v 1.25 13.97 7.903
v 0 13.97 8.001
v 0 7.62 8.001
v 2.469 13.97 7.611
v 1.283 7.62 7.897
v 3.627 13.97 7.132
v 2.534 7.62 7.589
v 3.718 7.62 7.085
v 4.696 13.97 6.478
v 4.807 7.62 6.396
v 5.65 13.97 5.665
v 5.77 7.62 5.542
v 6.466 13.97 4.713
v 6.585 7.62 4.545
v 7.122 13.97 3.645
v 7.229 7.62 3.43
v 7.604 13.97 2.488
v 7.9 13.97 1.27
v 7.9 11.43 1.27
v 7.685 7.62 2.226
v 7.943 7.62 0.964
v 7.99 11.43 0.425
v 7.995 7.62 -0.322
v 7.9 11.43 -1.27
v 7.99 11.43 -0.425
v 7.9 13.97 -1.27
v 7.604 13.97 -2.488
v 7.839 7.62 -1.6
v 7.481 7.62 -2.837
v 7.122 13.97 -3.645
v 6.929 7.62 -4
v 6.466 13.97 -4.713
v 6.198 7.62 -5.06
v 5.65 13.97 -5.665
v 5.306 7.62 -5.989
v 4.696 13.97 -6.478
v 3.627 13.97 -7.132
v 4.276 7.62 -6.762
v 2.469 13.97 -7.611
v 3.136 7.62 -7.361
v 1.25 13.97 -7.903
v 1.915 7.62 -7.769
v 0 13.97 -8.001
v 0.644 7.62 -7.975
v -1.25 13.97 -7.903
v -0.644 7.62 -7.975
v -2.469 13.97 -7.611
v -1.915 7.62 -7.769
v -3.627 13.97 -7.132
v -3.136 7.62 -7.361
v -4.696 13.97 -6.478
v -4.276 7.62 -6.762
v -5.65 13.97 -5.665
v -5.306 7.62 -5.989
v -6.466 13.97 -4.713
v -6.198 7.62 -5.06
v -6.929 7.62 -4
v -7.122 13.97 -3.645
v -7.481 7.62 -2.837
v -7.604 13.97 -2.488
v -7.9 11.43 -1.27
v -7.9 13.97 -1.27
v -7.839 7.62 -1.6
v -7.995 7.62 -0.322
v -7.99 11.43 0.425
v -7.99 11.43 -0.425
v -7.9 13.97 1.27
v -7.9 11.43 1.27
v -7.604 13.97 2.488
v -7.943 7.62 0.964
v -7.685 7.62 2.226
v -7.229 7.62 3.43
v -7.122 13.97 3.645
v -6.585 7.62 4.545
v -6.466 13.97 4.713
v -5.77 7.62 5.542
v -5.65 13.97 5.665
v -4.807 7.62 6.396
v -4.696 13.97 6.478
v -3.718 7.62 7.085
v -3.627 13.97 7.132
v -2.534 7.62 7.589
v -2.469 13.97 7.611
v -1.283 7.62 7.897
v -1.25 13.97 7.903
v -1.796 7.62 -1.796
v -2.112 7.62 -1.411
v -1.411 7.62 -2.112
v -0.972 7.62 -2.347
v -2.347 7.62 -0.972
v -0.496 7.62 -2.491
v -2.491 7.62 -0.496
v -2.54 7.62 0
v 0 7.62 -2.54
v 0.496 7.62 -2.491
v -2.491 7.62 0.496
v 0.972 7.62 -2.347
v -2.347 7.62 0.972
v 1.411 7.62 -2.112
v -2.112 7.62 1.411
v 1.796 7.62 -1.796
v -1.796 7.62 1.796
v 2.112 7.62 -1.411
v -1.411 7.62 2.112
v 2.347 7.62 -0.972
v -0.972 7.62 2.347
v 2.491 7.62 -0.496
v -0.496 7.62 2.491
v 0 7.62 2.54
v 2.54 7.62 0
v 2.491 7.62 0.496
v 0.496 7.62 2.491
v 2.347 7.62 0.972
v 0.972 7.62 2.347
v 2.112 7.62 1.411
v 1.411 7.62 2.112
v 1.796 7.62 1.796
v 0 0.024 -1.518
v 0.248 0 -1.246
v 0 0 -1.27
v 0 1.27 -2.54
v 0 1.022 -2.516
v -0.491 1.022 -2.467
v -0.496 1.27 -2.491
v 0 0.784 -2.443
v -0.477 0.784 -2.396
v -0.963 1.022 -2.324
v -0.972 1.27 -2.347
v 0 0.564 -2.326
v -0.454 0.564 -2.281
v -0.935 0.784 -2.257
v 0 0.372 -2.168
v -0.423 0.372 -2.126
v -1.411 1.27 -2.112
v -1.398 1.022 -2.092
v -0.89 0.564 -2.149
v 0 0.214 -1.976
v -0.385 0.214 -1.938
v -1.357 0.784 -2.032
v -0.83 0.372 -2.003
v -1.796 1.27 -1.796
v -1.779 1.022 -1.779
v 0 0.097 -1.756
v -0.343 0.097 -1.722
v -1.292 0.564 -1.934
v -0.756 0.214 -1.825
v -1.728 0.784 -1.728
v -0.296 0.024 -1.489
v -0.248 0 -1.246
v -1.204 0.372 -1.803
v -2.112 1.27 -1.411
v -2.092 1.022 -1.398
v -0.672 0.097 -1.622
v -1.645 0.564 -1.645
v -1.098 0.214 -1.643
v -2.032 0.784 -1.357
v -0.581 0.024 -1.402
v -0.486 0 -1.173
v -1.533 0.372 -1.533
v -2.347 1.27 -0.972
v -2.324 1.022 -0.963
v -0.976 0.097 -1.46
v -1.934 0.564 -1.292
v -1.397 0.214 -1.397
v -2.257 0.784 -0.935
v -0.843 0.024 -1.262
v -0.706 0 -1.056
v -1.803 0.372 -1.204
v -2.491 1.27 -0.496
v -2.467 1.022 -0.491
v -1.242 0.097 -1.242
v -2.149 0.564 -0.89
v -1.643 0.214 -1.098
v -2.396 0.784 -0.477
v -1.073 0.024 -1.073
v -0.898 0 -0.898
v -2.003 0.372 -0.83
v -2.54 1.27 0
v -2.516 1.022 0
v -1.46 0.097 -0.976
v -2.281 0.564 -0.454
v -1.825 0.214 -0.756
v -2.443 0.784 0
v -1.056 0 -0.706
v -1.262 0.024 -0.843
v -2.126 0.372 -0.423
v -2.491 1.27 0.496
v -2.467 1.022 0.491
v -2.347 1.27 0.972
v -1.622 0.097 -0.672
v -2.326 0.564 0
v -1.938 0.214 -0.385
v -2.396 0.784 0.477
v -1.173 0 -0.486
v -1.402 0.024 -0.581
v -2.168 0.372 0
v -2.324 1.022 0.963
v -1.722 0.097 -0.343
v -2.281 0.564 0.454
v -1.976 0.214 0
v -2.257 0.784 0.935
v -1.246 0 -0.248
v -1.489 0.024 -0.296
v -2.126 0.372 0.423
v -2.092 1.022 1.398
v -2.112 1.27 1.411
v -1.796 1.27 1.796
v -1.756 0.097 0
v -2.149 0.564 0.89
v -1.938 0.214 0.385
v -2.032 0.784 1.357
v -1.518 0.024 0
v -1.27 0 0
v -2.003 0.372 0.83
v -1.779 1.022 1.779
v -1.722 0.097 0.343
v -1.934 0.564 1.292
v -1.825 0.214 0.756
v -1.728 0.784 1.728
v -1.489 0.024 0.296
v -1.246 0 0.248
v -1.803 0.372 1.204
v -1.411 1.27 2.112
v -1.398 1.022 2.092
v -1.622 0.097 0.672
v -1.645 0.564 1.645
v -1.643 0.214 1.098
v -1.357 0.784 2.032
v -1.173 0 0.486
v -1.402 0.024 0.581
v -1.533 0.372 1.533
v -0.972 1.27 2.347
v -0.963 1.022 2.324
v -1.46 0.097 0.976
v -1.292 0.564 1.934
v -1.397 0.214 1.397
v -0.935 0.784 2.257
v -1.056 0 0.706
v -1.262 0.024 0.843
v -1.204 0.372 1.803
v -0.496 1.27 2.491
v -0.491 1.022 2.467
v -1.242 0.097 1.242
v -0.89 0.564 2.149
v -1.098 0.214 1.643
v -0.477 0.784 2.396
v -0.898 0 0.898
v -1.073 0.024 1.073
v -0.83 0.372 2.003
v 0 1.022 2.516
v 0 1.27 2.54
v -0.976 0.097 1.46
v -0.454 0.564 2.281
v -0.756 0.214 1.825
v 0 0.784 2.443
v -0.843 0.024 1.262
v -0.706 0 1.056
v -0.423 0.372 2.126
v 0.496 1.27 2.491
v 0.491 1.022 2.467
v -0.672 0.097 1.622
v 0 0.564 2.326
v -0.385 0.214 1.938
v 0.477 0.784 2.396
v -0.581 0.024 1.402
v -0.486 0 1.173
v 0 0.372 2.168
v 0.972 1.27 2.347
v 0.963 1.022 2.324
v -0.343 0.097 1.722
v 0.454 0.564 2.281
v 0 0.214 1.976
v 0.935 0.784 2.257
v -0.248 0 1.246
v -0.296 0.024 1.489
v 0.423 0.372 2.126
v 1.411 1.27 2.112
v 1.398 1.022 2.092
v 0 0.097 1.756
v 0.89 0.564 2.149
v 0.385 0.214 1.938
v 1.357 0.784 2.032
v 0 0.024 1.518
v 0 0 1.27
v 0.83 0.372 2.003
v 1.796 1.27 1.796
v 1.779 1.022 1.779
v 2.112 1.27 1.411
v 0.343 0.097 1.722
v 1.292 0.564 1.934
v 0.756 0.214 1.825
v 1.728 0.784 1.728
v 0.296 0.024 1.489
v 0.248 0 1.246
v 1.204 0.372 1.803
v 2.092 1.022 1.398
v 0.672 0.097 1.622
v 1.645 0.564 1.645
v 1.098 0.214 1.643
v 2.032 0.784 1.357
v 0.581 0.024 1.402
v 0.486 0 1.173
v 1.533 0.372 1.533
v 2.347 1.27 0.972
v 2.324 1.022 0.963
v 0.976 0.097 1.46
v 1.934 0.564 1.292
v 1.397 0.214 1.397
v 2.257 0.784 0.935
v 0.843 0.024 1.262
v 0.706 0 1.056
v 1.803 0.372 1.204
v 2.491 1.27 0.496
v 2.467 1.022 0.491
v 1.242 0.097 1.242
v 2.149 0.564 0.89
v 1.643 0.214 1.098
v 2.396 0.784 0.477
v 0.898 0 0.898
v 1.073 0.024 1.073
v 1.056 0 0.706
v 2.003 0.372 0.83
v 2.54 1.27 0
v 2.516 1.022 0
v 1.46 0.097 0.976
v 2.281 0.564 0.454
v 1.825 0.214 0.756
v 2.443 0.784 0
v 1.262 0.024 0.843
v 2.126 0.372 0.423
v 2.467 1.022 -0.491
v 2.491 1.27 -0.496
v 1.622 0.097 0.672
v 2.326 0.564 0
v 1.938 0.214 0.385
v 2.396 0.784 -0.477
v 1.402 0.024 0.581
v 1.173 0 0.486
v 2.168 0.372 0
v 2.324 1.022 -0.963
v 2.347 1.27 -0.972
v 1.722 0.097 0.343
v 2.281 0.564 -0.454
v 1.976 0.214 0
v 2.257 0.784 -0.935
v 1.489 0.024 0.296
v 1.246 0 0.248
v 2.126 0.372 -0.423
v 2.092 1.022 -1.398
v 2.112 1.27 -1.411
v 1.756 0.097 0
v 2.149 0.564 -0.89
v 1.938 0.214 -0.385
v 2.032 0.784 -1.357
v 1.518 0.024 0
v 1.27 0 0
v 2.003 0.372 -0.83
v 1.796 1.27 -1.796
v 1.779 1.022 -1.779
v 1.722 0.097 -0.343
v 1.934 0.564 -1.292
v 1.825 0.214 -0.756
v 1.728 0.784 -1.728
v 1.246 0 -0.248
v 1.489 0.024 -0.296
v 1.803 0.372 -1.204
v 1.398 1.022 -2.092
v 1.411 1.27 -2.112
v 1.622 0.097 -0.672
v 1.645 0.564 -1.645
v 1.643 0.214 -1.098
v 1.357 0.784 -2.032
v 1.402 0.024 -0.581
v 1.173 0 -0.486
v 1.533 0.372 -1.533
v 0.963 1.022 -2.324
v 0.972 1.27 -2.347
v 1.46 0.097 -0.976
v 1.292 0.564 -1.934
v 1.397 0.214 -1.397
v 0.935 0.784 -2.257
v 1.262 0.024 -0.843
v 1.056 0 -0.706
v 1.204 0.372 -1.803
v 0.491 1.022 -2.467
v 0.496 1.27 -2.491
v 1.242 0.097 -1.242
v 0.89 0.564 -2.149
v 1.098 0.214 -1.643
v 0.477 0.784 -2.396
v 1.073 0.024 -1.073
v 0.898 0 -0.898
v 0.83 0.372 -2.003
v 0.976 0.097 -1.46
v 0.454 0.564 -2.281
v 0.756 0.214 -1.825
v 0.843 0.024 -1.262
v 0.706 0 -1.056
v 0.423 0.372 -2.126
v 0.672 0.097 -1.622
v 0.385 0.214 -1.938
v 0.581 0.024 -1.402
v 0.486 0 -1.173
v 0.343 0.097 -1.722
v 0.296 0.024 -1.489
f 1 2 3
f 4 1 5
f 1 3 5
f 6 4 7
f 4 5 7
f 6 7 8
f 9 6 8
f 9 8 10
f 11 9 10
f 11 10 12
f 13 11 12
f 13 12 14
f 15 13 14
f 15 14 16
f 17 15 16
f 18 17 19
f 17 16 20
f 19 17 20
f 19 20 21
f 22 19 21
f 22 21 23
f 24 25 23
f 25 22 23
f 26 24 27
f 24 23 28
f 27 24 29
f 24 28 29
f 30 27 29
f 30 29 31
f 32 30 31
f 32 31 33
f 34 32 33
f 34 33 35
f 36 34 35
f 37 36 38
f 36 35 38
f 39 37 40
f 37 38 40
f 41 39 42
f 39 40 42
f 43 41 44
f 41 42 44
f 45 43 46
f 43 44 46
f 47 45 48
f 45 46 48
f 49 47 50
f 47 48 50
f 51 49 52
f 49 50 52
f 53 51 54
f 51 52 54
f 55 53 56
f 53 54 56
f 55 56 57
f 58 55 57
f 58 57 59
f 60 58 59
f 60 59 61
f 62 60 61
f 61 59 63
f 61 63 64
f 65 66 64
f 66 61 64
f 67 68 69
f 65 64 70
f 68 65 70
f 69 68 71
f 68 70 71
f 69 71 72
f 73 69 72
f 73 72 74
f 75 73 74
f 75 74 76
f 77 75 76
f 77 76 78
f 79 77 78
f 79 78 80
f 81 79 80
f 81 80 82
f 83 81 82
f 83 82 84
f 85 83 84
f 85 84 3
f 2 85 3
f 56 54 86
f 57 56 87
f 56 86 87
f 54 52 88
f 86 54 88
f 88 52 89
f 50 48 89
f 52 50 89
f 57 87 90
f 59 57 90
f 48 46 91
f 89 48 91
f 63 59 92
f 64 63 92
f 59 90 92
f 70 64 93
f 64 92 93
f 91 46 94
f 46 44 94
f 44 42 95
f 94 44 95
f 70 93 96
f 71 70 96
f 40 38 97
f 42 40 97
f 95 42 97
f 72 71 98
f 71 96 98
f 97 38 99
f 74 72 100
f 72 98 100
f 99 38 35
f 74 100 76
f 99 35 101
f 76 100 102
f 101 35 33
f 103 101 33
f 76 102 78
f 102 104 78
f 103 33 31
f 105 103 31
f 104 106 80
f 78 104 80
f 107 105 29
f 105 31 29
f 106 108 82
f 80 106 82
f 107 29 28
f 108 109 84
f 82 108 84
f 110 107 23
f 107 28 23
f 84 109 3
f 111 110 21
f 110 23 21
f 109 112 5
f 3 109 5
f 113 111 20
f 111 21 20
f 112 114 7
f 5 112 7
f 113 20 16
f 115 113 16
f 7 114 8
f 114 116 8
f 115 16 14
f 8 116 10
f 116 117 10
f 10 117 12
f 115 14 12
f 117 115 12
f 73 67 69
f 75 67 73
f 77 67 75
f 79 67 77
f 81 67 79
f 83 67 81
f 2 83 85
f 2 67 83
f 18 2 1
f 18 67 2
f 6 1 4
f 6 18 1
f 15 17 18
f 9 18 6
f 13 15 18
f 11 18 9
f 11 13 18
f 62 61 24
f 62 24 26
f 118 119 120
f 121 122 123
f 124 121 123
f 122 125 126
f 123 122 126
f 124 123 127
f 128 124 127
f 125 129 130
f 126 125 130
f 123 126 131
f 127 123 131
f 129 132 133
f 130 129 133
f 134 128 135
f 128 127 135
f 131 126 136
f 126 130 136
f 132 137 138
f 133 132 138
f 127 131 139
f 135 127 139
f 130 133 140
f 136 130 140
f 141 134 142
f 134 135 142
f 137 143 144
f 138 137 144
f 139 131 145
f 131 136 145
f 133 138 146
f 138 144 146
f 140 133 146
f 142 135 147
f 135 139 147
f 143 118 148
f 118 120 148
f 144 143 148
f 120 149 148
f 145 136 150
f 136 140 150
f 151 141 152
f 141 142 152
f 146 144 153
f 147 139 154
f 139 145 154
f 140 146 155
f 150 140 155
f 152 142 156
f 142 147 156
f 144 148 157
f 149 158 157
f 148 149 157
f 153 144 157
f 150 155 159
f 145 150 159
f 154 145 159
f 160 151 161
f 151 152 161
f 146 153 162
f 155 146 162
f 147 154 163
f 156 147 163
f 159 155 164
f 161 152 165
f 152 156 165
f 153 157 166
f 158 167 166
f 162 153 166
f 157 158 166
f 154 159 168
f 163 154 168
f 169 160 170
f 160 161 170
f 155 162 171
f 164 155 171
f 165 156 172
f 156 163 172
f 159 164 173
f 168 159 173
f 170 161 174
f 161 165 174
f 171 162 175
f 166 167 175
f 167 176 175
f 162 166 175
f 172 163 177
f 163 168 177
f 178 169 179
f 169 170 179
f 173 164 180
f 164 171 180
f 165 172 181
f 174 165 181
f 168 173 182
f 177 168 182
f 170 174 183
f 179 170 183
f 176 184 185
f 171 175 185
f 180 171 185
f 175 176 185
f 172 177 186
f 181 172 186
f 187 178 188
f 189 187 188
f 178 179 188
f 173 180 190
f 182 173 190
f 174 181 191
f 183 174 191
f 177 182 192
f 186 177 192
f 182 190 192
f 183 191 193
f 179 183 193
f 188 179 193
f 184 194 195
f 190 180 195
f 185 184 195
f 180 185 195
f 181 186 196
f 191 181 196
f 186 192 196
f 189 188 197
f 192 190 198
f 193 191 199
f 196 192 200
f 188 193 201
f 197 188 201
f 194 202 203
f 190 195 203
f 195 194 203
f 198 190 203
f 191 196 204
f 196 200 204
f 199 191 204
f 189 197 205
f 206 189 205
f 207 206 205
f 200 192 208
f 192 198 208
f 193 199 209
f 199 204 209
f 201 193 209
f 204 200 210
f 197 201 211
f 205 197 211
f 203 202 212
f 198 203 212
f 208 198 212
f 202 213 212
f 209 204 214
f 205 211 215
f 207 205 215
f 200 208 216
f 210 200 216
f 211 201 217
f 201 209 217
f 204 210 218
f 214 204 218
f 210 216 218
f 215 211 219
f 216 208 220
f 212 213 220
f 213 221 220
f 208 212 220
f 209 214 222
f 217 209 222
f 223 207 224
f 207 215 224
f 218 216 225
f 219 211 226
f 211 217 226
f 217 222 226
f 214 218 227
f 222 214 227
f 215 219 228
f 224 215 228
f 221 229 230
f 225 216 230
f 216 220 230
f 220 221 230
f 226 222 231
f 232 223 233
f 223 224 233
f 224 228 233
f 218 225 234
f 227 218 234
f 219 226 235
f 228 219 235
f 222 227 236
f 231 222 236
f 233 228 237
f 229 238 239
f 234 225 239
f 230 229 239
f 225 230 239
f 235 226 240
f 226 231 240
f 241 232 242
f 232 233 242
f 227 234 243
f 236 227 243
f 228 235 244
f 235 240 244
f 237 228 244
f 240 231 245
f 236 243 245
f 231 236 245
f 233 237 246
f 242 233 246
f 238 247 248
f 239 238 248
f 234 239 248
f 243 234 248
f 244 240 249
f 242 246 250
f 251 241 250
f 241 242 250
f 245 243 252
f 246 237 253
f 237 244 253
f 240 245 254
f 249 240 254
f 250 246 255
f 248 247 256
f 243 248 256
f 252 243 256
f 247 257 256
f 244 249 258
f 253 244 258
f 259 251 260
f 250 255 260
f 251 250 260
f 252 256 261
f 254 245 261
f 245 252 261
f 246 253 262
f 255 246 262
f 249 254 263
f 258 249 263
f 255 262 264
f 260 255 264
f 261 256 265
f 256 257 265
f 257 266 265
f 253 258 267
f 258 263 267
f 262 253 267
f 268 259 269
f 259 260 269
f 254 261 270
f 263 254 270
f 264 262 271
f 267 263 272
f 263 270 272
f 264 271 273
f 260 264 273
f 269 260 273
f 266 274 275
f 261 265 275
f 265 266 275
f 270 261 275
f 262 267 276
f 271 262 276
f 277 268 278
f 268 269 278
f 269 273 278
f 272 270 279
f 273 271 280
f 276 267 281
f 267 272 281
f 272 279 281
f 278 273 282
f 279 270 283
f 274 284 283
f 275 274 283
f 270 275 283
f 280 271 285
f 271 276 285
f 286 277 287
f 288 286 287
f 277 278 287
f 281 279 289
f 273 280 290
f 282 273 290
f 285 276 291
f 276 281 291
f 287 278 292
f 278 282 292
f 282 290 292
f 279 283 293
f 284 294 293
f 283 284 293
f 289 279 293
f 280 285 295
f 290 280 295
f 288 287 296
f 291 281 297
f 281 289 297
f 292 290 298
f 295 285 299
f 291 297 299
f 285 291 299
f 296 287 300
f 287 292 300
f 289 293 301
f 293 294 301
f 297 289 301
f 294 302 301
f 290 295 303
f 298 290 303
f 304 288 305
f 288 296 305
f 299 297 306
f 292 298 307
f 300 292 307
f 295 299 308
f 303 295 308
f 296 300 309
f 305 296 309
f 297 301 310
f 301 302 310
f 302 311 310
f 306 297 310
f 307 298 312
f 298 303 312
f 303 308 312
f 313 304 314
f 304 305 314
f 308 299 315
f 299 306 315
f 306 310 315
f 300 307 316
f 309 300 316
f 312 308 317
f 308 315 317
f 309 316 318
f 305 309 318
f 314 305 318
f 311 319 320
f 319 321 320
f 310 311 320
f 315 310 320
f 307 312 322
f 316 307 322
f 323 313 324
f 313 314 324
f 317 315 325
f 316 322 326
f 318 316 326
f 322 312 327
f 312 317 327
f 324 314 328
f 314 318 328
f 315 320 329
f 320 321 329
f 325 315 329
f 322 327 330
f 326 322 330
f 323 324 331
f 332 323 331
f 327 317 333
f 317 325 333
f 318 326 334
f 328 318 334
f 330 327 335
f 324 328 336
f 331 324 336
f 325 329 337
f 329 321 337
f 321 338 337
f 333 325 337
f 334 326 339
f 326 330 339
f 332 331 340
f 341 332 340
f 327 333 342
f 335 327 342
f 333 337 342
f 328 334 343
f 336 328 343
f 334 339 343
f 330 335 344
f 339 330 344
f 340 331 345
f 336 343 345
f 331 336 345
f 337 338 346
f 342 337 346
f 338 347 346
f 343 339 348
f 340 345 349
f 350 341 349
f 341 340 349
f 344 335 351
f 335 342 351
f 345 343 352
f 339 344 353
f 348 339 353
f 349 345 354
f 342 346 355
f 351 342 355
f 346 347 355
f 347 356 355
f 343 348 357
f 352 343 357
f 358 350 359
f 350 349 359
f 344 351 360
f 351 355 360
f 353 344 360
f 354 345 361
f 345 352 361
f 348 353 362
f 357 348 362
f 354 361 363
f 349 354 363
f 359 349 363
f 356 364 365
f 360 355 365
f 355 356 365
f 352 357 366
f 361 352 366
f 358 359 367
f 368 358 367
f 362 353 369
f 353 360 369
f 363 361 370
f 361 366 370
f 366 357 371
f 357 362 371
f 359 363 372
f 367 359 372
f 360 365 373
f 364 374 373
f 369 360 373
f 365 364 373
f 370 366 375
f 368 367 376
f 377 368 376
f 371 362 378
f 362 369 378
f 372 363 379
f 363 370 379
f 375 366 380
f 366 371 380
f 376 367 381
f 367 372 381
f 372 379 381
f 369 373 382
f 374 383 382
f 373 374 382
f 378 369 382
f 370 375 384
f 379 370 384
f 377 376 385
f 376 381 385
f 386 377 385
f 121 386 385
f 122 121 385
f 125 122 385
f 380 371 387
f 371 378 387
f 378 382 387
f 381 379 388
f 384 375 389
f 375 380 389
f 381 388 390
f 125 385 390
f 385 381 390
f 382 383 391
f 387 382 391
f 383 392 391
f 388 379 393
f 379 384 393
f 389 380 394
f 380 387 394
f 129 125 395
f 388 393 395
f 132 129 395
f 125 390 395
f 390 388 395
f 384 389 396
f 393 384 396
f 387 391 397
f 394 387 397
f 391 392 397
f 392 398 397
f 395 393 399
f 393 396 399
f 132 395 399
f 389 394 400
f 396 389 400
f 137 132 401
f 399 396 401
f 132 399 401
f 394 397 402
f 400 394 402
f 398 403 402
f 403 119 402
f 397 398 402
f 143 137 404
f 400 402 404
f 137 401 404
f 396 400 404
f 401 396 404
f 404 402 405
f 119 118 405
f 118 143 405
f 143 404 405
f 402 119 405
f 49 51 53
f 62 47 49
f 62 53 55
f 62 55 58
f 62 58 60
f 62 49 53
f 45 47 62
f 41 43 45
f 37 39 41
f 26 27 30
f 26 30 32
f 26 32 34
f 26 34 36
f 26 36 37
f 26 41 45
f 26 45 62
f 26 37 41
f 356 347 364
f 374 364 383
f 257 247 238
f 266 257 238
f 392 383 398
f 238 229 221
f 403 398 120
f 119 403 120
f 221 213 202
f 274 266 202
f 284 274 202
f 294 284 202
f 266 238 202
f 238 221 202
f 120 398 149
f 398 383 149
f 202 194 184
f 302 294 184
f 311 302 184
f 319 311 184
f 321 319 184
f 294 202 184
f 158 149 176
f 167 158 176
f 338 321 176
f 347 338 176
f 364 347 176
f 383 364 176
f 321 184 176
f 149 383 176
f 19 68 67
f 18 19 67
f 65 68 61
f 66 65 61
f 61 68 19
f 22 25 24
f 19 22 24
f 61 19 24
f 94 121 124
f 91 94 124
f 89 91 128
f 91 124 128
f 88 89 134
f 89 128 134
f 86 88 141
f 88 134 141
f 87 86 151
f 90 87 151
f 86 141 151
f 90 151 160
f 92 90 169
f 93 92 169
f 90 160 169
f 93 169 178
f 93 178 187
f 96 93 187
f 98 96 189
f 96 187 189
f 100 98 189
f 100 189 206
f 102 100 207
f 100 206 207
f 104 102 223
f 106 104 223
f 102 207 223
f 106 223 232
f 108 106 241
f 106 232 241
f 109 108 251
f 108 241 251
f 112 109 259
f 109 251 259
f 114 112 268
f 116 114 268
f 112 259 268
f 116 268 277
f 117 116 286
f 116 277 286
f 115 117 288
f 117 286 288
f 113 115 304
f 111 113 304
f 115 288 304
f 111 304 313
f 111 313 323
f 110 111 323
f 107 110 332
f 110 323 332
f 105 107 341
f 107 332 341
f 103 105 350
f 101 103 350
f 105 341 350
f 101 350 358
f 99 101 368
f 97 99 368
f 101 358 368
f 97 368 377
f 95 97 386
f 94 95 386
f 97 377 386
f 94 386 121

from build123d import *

# Parameters (mm, degrees)
SKETCH1_R           = 2.54
BOSS_EXTRUDE1_DEPTH = 7.62
SKETCH2_R           = 8.001
BOSS_EXTRUDE2_DEPTH = 6.35
FILLET1_R           = 1.27
SKETCH3_W           = 2.54
SKETCH3_H           = 2.54
CUT_EXTRUDE1_DEPTH  = 63.5


with BuildPart() as part:
    # Sketch1 → Boss-Extrude1 (new body)
    with BuildSketch(Plane(origin=(0, 0, 0), x_dir=(1, 0, 0), z_dir=(0, 1, 0))):
        with Locations(Location((0, 0, 0), (0, 0, 90))):
            Circle(SKETCH1_R)
    extrude(amount=BOSS_EXTRUDE1_DEPTH)

    # Sketch2 → Boss-Extrude2 (add)
    with BuildSketch(Plane(origin=(0, 7.62, 0), x_dir=(1, 0, 0), z_dir=(0, 1, 0))):
        with Locations(Location((0, 0, 0), (0, 0, 270))):
            Circle(SKETCH2_R)
    extrude(amount=BOSS_EXTRUDE2_DEPTH)

    # Fillet1
    fillet1_edges = [part.edges().sort_by_distance(p)[0] for p in [
        (0, 0, 2.54),
    ]]
    fillet(fillet1_edges, radius=FILLET1_R)

    # Sketch3 → Cut-Extrude1 (cut, symmetric)
    with BuildSketch(Plane(origin=(0, 0, 0), x_dir=(0, 0, -1), z_dir=(1, 0, 0))):
        with Locations((0, 12.7)):
            Rectangle(SKETCH3_W, SKETCH3_H)
    extrude(amount=CUT_EXTRUDE1_DEPTH, both=True, mode=Mode.SUBTRACT)


solid = part.part
